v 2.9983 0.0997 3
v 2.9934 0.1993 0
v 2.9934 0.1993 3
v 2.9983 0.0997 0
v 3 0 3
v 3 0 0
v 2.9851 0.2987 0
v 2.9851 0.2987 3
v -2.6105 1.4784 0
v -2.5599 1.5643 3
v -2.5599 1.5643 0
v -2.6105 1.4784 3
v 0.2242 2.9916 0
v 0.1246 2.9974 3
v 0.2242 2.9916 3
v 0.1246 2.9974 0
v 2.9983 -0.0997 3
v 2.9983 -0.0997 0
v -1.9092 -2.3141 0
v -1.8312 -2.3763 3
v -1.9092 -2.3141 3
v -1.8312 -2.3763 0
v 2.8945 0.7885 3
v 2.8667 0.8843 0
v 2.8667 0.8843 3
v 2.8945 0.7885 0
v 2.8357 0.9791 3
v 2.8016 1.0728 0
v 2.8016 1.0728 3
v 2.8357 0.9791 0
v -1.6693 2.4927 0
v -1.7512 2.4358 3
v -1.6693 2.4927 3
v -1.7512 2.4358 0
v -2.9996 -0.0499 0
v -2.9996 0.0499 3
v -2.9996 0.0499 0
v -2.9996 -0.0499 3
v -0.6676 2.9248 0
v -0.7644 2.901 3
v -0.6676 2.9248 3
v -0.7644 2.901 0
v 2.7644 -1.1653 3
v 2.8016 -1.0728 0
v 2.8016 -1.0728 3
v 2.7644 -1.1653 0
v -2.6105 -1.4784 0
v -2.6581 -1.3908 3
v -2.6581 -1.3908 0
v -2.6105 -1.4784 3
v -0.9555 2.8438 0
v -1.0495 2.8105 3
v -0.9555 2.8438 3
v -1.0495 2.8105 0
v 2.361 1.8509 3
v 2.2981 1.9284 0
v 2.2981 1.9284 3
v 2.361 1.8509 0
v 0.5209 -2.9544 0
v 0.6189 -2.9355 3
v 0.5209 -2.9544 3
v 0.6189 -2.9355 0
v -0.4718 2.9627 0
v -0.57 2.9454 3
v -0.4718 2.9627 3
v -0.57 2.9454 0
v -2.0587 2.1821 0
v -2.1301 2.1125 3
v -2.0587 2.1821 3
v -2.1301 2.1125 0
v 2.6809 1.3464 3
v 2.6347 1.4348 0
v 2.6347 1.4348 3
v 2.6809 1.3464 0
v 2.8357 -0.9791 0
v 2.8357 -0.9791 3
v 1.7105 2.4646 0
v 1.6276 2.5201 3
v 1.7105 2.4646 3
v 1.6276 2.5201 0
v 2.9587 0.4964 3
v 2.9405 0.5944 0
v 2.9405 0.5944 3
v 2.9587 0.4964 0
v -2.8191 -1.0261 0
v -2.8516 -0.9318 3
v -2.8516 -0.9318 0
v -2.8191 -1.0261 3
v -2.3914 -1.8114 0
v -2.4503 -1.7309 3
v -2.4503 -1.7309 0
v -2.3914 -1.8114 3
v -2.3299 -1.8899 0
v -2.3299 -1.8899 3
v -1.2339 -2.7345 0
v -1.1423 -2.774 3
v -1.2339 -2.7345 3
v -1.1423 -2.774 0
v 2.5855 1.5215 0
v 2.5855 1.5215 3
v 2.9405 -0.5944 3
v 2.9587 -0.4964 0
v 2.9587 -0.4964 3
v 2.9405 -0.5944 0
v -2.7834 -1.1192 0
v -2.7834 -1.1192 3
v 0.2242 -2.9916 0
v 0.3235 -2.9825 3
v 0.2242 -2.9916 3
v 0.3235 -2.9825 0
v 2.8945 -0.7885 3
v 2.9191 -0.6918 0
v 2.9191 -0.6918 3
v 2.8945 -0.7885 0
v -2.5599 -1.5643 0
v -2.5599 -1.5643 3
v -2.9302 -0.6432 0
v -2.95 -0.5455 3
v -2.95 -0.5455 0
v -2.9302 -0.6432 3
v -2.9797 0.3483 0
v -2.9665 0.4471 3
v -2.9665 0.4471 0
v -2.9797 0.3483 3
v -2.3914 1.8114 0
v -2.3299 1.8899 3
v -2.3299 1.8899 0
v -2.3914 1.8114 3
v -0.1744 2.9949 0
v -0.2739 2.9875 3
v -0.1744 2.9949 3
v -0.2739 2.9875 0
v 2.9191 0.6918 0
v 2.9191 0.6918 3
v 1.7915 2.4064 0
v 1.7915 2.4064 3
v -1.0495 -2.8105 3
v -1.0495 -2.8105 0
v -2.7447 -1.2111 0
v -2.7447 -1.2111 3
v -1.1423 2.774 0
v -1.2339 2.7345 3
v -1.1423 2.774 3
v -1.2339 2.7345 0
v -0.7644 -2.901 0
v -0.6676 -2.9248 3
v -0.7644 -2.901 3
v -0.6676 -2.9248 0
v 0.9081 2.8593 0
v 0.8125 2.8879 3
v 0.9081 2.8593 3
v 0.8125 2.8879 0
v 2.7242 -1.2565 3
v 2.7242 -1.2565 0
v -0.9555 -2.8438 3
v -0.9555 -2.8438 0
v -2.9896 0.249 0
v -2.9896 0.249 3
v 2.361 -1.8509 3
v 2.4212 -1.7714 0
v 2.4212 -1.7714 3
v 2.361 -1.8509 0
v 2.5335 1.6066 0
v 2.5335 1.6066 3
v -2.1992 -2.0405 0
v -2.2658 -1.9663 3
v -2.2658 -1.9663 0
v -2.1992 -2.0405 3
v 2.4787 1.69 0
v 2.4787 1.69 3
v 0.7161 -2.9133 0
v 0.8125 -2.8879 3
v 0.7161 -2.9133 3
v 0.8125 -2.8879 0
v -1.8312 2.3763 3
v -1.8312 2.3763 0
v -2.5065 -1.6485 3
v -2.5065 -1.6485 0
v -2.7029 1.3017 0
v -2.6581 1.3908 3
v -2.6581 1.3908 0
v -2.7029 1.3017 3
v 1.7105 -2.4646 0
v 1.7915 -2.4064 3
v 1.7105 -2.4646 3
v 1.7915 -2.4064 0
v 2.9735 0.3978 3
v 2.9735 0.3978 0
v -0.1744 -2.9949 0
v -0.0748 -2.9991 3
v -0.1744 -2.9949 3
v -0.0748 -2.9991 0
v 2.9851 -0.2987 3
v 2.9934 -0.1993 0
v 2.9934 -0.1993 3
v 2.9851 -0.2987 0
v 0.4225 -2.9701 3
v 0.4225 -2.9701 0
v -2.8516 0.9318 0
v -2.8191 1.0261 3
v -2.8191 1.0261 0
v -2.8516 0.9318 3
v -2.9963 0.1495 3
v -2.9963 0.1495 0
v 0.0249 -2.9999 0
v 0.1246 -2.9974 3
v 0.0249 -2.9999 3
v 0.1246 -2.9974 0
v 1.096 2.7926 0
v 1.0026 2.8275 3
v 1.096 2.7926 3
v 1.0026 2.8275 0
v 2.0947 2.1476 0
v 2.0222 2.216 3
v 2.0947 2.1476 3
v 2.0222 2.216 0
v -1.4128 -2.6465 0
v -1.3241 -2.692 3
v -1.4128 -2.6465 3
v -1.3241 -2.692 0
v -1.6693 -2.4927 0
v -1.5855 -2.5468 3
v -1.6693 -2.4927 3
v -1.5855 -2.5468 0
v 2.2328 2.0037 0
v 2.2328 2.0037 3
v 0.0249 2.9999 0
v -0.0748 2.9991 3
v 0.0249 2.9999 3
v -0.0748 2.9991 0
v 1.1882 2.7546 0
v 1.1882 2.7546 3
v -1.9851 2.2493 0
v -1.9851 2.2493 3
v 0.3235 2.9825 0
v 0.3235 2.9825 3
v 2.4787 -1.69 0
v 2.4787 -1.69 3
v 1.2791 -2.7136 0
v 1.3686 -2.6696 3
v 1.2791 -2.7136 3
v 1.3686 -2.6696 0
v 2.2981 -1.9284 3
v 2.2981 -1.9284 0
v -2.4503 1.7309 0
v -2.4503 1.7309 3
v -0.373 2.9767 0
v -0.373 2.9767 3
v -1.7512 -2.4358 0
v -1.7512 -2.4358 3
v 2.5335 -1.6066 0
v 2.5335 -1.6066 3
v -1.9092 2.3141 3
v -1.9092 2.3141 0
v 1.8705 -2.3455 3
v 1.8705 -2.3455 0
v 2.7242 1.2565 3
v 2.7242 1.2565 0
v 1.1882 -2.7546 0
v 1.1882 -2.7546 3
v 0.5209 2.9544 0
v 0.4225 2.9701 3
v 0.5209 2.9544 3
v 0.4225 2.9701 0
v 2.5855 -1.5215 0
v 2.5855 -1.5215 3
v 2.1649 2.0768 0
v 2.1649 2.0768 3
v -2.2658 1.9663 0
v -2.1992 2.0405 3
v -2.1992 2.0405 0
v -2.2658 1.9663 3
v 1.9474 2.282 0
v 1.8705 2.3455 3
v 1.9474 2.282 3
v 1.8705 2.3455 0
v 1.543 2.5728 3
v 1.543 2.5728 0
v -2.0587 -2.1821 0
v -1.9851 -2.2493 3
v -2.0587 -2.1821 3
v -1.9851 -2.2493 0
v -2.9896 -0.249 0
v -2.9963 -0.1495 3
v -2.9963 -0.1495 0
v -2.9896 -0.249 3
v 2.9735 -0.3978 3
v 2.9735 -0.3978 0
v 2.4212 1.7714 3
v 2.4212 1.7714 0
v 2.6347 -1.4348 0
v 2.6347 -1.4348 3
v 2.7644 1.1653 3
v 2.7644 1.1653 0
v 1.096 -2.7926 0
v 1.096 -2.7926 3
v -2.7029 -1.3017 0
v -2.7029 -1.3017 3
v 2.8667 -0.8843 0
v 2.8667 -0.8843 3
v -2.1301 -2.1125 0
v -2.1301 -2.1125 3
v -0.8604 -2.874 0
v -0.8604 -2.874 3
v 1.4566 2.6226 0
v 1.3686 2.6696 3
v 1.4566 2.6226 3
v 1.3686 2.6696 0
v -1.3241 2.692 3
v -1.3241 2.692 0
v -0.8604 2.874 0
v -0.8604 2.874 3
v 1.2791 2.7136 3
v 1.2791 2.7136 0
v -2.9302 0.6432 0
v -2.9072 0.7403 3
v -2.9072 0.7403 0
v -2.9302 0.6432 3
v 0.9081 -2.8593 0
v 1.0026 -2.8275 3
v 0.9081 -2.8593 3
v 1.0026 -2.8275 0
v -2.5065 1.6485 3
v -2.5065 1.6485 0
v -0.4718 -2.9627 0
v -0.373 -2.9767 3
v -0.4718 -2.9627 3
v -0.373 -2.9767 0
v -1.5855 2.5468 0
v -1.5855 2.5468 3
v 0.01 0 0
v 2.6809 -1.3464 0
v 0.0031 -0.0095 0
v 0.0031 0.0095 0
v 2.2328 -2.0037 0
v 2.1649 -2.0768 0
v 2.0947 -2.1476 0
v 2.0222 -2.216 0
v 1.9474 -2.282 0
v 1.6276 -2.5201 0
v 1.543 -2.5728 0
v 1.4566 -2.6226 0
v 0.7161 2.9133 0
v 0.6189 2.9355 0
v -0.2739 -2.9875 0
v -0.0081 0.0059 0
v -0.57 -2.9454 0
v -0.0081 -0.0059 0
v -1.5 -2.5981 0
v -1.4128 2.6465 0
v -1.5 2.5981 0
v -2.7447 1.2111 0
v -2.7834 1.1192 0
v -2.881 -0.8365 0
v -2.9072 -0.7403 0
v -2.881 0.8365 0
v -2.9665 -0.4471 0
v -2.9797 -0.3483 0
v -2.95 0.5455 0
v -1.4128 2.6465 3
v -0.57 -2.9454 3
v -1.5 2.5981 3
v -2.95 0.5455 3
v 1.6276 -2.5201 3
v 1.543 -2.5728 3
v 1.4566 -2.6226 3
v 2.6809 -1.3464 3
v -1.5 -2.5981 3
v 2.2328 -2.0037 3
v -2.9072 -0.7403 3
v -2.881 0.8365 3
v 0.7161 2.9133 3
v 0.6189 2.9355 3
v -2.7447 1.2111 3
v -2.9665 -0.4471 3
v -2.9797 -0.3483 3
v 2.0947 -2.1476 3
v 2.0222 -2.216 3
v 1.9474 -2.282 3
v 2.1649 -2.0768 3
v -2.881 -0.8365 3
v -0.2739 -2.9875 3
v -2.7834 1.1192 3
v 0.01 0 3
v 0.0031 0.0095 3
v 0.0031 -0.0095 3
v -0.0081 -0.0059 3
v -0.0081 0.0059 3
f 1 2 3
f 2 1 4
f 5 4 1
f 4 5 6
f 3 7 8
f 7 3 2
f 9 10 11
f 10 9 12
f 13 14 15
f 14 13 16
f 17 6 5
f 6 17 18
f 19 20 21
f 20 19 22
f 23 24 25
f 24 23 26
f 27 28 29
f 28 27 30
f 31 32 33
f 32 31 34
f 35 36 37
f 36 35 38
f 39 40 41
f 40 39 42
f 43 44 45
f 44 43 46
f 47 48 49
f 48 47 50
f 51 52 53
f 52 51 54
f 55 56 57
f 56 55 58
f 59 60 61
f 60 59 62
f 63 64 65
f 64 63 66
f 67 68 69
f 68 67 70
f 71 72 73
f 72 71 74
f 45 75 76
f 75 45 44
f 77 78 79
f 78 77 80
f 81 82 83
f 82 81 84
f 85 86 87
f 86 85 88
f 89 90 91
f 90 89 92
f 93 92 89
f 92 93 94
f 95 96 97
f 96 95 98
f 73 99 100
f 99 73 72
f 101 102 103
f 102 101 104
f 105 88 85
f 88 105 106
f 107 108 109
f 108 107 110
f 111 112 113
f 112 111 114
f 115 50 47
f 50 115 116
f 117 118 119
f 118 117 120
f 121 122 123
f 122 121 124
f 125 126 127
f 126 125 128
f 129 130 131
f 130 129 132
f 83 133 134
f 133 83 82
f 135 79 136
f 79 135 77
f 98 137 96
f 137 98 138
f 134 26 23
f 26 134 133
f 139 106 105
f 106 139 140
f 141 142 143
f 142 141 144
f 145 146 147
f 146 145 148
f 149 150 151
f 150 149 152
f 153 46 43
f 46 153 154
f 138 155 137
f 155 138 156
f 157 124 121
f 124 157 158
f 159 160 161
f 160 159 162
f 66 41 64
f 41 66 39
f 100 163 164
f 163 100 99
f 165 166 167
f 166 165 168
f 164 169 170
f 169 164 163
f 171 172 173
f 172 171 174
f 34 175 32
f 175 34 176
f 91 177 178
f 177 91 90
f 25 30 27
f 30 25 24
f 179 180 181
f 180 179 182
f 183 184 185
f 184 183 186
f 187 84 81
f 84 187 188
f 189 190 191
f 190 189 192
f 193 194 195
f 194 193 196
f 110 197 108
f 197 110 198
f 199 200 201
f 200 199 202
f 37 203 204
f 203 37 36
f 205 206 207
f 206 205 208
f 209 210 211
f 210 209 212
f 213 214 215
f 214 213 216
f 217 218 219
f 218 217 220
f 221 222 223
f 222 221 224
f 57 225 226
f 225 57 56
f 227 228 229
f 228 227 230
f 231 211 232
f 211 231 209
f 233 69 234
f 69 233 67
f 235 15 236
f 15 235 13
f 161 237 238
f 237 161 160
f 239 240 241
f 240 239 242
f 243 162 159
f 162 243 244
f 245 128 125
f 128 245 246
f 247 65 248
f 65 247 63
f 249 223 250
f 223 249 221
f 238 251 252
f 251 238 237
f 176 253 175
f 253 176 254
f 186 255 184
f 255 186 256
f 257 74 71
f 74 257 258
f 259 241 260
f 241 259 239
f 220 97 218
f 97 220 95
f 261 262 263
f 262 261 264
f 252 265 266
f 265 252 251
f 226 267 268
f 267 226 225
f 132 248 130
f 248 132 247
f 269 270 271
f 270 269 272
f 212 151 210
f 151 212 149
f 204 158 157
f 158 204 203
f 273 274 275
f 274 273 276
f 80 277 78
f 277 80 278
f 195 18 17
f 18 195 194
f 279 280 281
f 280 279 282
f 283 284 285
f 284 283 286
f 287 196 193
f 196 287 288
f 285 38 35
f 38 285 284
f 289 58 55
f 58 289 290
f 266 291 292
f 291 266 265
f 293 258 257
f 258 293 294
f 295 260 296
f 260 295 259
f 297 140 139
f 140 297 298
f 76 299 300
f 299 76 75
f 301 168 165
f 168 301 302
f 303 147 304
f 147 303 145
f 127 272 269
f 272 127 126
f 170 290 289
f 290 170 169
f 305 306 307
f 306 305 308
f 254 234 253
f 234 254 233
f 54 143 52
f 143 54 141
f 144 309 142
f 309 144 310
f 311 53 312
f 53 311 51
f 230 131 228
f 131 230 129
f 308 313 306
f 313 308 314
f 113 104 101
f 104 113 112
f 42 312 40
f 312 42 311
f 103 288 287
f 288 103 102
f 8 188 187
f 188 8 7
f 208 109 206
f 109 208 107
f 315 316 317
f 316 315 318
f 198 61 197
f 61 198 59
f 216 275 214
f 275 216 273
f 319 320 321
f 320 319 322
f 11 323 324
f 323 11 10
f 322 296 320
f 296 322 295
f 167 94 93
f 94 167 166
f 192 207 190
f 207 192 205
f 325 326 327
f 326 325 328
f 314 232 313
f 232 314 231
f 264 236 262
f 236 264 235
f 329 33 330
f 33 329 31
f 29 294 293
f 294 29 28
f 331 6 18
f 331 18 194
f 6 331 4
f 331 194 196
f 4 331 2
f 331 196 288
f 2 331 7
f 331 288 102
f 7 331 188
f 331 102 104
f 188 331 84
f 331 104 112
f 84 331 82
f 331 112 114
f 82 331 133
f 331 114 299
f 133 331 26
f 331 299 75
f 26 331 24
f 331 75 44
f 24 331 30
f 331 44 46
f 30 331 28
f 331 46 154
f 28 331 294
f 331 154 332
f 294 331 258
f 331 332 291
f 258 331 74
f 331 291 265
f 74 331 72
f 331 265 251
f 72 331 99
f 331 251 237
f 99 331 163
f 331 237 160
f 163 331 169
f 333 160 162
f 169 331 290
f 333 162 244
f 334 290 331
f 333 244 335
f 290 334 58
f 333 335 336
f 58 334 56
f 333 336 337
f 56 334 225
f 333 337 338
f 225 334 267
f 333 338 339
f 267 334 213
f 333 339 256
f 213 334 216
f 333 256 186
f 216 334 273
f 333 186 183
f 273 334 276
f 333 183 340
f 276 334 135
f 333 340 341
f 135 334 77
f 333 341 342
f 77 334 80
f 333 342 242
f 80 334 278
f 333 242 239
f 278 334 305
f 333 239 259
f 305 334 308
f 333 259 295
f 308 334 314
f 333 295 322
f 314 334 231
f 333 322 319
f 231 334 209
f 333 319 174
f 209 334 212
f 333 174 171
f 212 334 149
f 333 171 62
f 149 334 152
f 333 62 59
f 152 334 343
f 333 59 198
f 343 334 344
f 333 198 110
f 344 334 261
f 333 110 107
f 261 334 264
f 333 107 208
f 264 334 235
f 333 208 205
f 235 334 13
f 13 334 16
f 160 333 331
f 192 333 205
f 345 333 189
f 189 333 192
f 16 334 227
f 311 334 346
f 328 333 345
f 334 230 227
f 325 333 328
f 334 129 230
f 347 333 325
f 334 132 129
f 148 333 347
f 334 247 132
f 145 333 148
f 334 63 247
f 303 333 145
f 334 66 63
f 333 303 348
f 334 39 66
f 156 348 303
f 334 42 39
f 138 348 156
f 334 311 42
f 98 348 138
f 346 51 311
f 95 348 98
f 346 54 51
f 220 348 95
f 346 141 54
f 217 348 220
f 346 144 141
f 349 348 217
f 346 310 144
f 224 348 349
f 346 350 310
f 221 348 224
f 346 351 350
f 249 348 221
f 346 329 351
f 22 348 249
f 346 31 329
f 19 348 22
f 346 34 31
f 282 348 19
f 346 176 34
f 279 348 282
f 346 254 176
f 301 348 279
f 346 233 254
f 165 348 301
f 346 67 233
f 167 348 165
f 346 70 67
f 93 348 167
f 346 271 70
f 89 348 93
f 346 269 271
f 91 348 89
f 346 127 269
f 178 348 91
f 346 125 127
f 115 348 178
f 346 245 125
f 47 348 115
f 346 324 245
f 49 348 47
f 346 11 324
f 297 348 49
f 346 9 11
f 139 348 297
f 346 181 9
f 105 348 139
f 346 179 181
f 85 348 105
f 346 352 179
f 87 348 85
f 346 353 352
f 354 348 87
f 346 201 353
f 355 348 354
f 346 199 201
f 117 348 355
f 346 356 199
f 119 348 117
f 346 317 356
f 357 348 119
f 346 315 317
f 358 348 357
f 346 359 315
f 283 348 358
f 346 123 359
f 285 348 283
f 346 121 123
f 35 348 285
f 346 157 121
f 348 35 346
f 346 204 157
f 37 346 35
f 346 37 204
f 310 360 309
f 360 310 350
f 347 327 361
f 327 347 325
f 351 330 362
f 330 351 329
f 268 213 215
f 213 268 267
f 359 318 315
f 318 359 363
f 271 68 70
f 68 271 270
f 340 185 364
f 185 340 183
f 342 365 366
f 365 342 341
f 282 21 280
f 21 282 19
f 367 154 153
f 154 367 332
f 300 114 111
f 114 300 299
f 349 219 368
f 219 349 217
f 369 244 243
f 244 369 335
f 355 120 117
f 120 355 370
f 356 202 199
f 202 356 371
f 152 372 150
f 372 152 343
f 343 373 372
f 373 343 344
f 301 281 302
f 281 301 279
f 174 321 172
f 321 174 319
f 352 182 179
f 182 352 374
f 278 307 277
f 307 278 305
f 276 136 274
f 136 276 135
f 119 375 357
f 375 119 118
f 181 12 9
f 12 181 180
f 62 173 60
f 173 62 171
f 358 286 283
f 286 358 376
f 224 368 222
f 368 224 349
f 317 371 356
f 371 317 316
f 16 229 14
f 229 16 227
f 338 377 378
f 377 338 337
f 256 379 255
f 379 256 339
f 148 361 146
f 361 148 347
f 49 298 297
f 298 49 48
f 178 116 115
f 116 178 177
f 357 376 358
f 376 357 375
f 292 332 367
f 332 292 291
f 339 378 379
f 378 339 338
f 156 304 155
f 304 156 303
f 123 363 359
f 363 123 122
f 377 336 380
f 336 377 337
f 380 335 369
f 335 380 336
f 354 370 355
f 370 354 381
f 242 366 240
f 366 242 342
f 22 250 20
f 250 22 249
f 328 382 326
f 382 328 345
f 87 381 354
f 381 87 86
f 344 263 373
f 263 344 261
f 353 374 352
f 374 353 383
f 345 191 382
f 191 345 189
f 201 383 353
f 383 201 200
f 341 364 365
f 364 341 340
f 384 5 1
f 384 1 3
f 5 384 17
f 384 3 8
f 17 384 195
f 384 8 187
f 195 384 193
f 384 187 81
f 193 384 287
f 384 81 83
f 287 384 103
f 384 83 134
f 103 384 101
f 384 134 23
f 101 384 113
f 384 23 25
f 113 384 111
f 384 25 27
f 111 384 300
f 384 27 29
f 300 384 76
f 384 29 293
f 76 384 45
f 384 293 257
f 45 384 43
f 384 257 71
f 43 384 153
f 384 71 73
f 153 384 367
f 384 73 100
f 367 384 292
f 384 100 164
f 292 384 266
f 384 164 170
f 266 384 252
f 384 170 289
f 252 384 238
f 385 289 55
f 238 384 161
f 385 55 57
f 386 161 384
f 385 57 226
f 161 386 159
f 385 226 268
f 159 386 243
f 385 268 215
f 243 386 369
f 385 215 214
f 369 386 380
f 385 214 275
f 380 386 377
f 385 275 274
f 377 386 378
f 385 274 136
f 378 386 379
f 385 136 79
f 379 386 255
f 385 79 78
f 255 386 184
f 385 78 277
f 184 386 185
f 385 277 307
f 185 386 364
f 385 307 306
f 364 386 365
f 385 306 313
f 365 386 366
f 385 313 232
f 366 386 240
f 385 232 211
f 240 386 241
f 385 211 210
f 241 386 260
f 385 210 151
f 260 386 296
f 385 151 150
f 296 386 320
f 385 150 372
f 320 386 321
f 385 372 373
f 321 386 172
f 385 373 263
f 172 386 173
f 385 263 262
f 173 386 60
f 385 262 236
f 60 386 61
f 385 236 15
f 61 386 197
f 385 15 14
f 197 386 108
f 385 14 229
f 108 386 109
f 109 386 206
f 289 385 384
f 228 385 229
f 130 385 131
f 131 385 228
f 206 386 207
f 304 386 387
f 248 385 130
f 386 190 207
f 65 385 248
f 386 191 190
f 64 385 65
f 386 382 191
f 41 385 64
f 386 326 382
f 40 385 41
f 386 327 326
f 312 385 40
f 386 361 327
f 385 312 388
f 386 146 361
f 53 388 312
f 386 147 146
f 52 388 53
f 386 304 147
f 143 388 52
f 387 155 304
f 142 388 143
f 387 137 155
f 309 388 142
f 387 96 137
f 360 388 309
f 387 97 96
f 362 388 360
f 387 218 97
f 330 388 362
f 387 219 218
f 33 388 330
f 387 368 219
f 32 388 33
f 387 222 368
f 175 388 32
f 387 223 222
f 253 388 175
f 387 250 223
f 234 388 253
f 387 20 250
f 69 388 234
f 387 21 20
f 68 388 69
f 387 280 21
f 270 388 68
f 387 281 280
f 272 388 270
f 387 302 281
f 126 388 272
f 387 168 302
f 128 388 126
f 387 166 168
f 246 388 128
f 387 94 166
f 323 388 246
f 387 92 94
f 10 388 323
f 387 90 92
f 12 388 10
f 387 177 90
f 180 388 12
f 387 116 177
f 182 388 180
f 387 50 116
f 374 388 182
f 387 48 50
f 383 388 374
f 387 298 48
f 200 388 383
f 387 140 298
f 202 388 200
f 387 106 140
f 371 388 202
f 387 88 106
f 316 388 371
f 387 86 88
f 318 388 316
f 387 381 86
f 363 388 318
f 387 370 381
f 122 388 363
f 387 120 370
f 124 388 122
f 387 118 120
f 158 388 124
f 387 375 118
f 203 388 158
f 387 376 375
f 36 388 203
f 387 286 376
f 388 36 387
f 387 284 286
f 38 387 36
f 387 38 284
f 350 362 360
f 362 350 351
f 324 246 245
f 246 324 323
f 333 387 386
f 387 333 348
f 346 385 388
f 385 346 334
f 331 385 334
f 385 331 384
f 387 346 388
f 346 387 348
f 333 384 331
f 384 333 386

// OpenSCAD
$fs = 0.1;
$fa = 1;
difference() {
	cylinder(r=3, h=3);
	cylinder(r=0.01, h=3);
}
